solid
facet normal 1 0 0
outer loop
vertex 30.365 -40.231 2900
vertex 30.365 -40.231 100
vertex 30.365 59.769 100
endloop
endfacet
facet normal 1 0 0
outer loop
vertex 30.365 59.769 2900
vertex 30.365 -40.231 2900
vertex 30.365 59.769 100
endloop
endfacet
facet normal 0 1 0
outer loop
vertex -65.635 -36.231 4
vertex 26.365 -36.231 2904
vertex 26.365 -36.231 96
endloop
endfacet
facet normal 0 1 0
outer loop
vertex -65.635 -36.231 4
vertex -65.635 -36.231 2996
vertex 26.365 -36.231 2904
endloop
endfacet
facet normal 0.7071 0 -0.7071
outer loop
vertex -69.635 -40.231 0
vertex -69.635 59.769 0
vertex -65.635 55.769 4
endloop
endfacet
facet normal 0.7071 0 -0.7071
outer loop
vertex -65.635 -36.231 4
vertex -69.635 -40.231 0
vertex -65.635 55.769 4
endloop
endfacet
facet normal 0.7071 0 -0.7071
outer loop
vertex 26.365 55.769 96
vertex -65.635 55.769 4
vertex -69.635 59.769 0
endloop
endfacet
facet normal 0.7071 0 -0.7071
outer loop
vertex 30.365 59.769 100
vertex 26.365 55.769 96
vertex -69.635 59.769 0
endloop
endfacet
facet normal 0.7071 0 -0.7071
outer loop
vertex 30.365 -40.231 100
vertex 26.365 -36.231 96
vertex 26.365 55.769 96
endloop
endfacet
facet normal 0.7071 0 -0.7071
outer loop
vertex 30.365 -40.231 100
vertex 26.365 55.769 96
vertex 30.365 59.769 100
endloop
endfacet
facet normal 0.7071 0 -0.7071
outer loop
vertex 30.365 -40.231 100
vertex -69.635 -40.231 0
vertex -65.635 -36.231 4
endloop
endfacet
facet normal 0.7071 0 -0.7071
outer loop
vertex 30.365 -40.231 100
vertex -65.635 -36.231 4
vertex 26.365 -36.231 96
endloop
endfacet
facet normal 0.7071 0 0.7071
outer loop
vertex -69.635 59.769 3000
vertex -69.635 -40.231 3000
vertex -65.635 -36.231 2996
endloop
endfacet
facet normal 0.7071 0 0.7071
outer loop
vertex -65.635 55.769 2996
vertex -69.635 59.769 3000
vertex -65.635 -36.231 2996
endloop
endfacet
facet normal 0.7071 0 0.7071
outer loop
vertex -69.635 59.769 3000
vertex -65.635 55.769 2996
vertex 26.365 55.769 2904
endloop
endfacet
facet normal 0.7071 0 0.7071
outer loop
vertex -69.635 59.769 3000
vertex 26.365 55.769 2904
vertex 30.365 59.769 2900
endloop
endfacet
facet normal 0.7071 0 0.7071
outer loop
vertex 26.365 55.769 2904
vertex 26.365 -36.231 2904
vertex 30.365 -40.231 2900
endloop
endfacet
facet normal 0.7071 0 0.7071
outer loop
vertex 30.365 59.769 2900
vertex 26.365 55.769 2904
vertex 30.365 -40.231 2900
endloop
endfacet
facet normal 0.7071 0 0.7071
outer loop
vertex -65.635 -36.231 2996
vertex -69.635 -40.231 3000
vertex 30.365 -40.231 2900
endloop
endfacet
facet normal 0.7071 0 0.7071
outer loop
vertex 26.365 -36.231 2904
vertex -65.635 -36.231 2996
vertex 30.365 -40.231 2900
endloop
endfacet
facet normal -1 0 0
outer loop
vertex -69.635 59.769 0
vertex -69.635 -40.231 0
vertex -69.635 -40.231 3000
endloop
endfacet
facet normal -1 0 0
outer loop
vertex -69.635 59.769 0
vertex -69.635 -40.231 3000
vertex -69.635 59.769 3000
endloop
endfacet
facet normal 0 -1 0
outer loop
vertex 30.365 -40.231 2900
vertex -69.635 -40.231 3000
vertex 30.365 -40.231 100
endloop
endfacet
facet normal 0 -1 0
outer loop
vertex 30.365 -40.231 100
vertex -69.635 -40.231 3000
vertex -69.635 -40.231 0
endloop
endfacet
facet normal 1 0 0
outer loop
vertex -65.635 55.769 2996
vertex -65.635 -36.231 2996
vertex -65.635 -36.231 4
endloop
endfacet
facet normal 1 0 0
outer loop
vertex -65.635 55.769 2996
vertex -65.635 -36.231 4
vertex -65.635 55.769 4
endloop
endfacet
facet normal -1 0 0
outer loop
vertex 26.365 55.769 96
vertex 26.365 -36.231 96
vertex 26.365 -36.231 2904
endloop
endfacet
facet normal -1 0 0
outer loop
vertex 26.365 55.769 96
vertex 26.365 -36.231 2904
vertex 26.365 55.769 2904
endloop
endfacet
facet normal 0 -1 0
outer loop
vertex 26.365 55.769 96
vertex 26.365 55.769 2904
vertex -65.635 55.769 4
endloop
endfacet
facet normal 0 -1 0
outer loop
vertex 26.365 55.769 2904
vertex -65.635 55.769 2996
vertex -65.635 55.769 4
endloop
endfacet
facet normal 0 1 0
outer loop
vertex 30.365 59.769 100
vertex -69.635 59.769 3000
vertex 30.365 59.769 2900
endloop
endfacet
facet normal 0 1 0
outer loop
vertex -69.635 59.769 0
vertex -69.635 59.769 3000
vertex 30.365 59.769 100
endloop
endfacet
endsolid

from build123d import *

# Parameters (mm, degrees)
CROQUIS1_W                 = 100
CROQUIS1_H                 = 100
CROQUIS1_W_2               = 92
CROQUIS1_H_2               = 92
SALIENTE_EXTRUIR3_DEPTH    = 3000
CORTAR_EXTRUIR1_DEPTH      = 409
CORTAR_EXTRUIR1_DEPTH_BACK = 390
CORTAR_EXTRUIR2_DEPTH      = 232
CORTAR_EXTRUIR2_DEPTH_BACK = 271


with BuildPart() as part:
    # Croquis1 → Saliente-Extruir3 (new body)
    with BuildSketch(Plane.XY):
        with Locations((-19.634513149, 9.769055649)):
            Rectangle(CROQUIS1_W, CROQUIS1_H)
        with Locations((-19.634513149, 9.769055649)):
            Rectangle(CROQUIS1_W_2, CROQUIS1_H_2, mode=Mode.SUBTRACT)
    extrude(amount=SALIENTE_EXTRUIR3_DEPTH)

    # Croquis2 → Cortar-Extruir1 (cut, two sides: drawn at the far end of the back side and taken through both)
    with BuildSketch(Plane(origin=(0, 59.769055649, 0), x_dir=(1, 0, 0), z_dir=(0, 1, 0)).offset(-CORTAR_EXTRUIR1_DEPTH_BACK)):
        Polygon((-69.634513149, 0), (30.365486851, -100), (30.365486851, 0), align=None)
    extrude(amount=CORTAR_EXTRUIR1_DEPTH + CORTAR_EXTRUIR1_DEPTH_BACK, mode=Mode.SUBTRACT)

    # Croquis3 → Cortar-Extruir2 (cut, two sides: drawn at the far end of the back side and taken through both)
    with BuildSketch(Plane(origin=(0, 59.769055649, 0), x_dir=(1, 0, 0), z_dir=(0, 1, 0)).offset(-CORTAR_EXTRUIR2_DEPTH_BACK)):
        Polygon((-69.634513149, -3000), (30.365486851, -2900), (30.365486851, -3000), align=None)
    extrude(amount=CORTAR_EXTRUIR2_DEPTH + CORTAR_EXTRUIR2_DEPTH_BACK, mode=Mode.SUBTRACT)


solid = part.part
